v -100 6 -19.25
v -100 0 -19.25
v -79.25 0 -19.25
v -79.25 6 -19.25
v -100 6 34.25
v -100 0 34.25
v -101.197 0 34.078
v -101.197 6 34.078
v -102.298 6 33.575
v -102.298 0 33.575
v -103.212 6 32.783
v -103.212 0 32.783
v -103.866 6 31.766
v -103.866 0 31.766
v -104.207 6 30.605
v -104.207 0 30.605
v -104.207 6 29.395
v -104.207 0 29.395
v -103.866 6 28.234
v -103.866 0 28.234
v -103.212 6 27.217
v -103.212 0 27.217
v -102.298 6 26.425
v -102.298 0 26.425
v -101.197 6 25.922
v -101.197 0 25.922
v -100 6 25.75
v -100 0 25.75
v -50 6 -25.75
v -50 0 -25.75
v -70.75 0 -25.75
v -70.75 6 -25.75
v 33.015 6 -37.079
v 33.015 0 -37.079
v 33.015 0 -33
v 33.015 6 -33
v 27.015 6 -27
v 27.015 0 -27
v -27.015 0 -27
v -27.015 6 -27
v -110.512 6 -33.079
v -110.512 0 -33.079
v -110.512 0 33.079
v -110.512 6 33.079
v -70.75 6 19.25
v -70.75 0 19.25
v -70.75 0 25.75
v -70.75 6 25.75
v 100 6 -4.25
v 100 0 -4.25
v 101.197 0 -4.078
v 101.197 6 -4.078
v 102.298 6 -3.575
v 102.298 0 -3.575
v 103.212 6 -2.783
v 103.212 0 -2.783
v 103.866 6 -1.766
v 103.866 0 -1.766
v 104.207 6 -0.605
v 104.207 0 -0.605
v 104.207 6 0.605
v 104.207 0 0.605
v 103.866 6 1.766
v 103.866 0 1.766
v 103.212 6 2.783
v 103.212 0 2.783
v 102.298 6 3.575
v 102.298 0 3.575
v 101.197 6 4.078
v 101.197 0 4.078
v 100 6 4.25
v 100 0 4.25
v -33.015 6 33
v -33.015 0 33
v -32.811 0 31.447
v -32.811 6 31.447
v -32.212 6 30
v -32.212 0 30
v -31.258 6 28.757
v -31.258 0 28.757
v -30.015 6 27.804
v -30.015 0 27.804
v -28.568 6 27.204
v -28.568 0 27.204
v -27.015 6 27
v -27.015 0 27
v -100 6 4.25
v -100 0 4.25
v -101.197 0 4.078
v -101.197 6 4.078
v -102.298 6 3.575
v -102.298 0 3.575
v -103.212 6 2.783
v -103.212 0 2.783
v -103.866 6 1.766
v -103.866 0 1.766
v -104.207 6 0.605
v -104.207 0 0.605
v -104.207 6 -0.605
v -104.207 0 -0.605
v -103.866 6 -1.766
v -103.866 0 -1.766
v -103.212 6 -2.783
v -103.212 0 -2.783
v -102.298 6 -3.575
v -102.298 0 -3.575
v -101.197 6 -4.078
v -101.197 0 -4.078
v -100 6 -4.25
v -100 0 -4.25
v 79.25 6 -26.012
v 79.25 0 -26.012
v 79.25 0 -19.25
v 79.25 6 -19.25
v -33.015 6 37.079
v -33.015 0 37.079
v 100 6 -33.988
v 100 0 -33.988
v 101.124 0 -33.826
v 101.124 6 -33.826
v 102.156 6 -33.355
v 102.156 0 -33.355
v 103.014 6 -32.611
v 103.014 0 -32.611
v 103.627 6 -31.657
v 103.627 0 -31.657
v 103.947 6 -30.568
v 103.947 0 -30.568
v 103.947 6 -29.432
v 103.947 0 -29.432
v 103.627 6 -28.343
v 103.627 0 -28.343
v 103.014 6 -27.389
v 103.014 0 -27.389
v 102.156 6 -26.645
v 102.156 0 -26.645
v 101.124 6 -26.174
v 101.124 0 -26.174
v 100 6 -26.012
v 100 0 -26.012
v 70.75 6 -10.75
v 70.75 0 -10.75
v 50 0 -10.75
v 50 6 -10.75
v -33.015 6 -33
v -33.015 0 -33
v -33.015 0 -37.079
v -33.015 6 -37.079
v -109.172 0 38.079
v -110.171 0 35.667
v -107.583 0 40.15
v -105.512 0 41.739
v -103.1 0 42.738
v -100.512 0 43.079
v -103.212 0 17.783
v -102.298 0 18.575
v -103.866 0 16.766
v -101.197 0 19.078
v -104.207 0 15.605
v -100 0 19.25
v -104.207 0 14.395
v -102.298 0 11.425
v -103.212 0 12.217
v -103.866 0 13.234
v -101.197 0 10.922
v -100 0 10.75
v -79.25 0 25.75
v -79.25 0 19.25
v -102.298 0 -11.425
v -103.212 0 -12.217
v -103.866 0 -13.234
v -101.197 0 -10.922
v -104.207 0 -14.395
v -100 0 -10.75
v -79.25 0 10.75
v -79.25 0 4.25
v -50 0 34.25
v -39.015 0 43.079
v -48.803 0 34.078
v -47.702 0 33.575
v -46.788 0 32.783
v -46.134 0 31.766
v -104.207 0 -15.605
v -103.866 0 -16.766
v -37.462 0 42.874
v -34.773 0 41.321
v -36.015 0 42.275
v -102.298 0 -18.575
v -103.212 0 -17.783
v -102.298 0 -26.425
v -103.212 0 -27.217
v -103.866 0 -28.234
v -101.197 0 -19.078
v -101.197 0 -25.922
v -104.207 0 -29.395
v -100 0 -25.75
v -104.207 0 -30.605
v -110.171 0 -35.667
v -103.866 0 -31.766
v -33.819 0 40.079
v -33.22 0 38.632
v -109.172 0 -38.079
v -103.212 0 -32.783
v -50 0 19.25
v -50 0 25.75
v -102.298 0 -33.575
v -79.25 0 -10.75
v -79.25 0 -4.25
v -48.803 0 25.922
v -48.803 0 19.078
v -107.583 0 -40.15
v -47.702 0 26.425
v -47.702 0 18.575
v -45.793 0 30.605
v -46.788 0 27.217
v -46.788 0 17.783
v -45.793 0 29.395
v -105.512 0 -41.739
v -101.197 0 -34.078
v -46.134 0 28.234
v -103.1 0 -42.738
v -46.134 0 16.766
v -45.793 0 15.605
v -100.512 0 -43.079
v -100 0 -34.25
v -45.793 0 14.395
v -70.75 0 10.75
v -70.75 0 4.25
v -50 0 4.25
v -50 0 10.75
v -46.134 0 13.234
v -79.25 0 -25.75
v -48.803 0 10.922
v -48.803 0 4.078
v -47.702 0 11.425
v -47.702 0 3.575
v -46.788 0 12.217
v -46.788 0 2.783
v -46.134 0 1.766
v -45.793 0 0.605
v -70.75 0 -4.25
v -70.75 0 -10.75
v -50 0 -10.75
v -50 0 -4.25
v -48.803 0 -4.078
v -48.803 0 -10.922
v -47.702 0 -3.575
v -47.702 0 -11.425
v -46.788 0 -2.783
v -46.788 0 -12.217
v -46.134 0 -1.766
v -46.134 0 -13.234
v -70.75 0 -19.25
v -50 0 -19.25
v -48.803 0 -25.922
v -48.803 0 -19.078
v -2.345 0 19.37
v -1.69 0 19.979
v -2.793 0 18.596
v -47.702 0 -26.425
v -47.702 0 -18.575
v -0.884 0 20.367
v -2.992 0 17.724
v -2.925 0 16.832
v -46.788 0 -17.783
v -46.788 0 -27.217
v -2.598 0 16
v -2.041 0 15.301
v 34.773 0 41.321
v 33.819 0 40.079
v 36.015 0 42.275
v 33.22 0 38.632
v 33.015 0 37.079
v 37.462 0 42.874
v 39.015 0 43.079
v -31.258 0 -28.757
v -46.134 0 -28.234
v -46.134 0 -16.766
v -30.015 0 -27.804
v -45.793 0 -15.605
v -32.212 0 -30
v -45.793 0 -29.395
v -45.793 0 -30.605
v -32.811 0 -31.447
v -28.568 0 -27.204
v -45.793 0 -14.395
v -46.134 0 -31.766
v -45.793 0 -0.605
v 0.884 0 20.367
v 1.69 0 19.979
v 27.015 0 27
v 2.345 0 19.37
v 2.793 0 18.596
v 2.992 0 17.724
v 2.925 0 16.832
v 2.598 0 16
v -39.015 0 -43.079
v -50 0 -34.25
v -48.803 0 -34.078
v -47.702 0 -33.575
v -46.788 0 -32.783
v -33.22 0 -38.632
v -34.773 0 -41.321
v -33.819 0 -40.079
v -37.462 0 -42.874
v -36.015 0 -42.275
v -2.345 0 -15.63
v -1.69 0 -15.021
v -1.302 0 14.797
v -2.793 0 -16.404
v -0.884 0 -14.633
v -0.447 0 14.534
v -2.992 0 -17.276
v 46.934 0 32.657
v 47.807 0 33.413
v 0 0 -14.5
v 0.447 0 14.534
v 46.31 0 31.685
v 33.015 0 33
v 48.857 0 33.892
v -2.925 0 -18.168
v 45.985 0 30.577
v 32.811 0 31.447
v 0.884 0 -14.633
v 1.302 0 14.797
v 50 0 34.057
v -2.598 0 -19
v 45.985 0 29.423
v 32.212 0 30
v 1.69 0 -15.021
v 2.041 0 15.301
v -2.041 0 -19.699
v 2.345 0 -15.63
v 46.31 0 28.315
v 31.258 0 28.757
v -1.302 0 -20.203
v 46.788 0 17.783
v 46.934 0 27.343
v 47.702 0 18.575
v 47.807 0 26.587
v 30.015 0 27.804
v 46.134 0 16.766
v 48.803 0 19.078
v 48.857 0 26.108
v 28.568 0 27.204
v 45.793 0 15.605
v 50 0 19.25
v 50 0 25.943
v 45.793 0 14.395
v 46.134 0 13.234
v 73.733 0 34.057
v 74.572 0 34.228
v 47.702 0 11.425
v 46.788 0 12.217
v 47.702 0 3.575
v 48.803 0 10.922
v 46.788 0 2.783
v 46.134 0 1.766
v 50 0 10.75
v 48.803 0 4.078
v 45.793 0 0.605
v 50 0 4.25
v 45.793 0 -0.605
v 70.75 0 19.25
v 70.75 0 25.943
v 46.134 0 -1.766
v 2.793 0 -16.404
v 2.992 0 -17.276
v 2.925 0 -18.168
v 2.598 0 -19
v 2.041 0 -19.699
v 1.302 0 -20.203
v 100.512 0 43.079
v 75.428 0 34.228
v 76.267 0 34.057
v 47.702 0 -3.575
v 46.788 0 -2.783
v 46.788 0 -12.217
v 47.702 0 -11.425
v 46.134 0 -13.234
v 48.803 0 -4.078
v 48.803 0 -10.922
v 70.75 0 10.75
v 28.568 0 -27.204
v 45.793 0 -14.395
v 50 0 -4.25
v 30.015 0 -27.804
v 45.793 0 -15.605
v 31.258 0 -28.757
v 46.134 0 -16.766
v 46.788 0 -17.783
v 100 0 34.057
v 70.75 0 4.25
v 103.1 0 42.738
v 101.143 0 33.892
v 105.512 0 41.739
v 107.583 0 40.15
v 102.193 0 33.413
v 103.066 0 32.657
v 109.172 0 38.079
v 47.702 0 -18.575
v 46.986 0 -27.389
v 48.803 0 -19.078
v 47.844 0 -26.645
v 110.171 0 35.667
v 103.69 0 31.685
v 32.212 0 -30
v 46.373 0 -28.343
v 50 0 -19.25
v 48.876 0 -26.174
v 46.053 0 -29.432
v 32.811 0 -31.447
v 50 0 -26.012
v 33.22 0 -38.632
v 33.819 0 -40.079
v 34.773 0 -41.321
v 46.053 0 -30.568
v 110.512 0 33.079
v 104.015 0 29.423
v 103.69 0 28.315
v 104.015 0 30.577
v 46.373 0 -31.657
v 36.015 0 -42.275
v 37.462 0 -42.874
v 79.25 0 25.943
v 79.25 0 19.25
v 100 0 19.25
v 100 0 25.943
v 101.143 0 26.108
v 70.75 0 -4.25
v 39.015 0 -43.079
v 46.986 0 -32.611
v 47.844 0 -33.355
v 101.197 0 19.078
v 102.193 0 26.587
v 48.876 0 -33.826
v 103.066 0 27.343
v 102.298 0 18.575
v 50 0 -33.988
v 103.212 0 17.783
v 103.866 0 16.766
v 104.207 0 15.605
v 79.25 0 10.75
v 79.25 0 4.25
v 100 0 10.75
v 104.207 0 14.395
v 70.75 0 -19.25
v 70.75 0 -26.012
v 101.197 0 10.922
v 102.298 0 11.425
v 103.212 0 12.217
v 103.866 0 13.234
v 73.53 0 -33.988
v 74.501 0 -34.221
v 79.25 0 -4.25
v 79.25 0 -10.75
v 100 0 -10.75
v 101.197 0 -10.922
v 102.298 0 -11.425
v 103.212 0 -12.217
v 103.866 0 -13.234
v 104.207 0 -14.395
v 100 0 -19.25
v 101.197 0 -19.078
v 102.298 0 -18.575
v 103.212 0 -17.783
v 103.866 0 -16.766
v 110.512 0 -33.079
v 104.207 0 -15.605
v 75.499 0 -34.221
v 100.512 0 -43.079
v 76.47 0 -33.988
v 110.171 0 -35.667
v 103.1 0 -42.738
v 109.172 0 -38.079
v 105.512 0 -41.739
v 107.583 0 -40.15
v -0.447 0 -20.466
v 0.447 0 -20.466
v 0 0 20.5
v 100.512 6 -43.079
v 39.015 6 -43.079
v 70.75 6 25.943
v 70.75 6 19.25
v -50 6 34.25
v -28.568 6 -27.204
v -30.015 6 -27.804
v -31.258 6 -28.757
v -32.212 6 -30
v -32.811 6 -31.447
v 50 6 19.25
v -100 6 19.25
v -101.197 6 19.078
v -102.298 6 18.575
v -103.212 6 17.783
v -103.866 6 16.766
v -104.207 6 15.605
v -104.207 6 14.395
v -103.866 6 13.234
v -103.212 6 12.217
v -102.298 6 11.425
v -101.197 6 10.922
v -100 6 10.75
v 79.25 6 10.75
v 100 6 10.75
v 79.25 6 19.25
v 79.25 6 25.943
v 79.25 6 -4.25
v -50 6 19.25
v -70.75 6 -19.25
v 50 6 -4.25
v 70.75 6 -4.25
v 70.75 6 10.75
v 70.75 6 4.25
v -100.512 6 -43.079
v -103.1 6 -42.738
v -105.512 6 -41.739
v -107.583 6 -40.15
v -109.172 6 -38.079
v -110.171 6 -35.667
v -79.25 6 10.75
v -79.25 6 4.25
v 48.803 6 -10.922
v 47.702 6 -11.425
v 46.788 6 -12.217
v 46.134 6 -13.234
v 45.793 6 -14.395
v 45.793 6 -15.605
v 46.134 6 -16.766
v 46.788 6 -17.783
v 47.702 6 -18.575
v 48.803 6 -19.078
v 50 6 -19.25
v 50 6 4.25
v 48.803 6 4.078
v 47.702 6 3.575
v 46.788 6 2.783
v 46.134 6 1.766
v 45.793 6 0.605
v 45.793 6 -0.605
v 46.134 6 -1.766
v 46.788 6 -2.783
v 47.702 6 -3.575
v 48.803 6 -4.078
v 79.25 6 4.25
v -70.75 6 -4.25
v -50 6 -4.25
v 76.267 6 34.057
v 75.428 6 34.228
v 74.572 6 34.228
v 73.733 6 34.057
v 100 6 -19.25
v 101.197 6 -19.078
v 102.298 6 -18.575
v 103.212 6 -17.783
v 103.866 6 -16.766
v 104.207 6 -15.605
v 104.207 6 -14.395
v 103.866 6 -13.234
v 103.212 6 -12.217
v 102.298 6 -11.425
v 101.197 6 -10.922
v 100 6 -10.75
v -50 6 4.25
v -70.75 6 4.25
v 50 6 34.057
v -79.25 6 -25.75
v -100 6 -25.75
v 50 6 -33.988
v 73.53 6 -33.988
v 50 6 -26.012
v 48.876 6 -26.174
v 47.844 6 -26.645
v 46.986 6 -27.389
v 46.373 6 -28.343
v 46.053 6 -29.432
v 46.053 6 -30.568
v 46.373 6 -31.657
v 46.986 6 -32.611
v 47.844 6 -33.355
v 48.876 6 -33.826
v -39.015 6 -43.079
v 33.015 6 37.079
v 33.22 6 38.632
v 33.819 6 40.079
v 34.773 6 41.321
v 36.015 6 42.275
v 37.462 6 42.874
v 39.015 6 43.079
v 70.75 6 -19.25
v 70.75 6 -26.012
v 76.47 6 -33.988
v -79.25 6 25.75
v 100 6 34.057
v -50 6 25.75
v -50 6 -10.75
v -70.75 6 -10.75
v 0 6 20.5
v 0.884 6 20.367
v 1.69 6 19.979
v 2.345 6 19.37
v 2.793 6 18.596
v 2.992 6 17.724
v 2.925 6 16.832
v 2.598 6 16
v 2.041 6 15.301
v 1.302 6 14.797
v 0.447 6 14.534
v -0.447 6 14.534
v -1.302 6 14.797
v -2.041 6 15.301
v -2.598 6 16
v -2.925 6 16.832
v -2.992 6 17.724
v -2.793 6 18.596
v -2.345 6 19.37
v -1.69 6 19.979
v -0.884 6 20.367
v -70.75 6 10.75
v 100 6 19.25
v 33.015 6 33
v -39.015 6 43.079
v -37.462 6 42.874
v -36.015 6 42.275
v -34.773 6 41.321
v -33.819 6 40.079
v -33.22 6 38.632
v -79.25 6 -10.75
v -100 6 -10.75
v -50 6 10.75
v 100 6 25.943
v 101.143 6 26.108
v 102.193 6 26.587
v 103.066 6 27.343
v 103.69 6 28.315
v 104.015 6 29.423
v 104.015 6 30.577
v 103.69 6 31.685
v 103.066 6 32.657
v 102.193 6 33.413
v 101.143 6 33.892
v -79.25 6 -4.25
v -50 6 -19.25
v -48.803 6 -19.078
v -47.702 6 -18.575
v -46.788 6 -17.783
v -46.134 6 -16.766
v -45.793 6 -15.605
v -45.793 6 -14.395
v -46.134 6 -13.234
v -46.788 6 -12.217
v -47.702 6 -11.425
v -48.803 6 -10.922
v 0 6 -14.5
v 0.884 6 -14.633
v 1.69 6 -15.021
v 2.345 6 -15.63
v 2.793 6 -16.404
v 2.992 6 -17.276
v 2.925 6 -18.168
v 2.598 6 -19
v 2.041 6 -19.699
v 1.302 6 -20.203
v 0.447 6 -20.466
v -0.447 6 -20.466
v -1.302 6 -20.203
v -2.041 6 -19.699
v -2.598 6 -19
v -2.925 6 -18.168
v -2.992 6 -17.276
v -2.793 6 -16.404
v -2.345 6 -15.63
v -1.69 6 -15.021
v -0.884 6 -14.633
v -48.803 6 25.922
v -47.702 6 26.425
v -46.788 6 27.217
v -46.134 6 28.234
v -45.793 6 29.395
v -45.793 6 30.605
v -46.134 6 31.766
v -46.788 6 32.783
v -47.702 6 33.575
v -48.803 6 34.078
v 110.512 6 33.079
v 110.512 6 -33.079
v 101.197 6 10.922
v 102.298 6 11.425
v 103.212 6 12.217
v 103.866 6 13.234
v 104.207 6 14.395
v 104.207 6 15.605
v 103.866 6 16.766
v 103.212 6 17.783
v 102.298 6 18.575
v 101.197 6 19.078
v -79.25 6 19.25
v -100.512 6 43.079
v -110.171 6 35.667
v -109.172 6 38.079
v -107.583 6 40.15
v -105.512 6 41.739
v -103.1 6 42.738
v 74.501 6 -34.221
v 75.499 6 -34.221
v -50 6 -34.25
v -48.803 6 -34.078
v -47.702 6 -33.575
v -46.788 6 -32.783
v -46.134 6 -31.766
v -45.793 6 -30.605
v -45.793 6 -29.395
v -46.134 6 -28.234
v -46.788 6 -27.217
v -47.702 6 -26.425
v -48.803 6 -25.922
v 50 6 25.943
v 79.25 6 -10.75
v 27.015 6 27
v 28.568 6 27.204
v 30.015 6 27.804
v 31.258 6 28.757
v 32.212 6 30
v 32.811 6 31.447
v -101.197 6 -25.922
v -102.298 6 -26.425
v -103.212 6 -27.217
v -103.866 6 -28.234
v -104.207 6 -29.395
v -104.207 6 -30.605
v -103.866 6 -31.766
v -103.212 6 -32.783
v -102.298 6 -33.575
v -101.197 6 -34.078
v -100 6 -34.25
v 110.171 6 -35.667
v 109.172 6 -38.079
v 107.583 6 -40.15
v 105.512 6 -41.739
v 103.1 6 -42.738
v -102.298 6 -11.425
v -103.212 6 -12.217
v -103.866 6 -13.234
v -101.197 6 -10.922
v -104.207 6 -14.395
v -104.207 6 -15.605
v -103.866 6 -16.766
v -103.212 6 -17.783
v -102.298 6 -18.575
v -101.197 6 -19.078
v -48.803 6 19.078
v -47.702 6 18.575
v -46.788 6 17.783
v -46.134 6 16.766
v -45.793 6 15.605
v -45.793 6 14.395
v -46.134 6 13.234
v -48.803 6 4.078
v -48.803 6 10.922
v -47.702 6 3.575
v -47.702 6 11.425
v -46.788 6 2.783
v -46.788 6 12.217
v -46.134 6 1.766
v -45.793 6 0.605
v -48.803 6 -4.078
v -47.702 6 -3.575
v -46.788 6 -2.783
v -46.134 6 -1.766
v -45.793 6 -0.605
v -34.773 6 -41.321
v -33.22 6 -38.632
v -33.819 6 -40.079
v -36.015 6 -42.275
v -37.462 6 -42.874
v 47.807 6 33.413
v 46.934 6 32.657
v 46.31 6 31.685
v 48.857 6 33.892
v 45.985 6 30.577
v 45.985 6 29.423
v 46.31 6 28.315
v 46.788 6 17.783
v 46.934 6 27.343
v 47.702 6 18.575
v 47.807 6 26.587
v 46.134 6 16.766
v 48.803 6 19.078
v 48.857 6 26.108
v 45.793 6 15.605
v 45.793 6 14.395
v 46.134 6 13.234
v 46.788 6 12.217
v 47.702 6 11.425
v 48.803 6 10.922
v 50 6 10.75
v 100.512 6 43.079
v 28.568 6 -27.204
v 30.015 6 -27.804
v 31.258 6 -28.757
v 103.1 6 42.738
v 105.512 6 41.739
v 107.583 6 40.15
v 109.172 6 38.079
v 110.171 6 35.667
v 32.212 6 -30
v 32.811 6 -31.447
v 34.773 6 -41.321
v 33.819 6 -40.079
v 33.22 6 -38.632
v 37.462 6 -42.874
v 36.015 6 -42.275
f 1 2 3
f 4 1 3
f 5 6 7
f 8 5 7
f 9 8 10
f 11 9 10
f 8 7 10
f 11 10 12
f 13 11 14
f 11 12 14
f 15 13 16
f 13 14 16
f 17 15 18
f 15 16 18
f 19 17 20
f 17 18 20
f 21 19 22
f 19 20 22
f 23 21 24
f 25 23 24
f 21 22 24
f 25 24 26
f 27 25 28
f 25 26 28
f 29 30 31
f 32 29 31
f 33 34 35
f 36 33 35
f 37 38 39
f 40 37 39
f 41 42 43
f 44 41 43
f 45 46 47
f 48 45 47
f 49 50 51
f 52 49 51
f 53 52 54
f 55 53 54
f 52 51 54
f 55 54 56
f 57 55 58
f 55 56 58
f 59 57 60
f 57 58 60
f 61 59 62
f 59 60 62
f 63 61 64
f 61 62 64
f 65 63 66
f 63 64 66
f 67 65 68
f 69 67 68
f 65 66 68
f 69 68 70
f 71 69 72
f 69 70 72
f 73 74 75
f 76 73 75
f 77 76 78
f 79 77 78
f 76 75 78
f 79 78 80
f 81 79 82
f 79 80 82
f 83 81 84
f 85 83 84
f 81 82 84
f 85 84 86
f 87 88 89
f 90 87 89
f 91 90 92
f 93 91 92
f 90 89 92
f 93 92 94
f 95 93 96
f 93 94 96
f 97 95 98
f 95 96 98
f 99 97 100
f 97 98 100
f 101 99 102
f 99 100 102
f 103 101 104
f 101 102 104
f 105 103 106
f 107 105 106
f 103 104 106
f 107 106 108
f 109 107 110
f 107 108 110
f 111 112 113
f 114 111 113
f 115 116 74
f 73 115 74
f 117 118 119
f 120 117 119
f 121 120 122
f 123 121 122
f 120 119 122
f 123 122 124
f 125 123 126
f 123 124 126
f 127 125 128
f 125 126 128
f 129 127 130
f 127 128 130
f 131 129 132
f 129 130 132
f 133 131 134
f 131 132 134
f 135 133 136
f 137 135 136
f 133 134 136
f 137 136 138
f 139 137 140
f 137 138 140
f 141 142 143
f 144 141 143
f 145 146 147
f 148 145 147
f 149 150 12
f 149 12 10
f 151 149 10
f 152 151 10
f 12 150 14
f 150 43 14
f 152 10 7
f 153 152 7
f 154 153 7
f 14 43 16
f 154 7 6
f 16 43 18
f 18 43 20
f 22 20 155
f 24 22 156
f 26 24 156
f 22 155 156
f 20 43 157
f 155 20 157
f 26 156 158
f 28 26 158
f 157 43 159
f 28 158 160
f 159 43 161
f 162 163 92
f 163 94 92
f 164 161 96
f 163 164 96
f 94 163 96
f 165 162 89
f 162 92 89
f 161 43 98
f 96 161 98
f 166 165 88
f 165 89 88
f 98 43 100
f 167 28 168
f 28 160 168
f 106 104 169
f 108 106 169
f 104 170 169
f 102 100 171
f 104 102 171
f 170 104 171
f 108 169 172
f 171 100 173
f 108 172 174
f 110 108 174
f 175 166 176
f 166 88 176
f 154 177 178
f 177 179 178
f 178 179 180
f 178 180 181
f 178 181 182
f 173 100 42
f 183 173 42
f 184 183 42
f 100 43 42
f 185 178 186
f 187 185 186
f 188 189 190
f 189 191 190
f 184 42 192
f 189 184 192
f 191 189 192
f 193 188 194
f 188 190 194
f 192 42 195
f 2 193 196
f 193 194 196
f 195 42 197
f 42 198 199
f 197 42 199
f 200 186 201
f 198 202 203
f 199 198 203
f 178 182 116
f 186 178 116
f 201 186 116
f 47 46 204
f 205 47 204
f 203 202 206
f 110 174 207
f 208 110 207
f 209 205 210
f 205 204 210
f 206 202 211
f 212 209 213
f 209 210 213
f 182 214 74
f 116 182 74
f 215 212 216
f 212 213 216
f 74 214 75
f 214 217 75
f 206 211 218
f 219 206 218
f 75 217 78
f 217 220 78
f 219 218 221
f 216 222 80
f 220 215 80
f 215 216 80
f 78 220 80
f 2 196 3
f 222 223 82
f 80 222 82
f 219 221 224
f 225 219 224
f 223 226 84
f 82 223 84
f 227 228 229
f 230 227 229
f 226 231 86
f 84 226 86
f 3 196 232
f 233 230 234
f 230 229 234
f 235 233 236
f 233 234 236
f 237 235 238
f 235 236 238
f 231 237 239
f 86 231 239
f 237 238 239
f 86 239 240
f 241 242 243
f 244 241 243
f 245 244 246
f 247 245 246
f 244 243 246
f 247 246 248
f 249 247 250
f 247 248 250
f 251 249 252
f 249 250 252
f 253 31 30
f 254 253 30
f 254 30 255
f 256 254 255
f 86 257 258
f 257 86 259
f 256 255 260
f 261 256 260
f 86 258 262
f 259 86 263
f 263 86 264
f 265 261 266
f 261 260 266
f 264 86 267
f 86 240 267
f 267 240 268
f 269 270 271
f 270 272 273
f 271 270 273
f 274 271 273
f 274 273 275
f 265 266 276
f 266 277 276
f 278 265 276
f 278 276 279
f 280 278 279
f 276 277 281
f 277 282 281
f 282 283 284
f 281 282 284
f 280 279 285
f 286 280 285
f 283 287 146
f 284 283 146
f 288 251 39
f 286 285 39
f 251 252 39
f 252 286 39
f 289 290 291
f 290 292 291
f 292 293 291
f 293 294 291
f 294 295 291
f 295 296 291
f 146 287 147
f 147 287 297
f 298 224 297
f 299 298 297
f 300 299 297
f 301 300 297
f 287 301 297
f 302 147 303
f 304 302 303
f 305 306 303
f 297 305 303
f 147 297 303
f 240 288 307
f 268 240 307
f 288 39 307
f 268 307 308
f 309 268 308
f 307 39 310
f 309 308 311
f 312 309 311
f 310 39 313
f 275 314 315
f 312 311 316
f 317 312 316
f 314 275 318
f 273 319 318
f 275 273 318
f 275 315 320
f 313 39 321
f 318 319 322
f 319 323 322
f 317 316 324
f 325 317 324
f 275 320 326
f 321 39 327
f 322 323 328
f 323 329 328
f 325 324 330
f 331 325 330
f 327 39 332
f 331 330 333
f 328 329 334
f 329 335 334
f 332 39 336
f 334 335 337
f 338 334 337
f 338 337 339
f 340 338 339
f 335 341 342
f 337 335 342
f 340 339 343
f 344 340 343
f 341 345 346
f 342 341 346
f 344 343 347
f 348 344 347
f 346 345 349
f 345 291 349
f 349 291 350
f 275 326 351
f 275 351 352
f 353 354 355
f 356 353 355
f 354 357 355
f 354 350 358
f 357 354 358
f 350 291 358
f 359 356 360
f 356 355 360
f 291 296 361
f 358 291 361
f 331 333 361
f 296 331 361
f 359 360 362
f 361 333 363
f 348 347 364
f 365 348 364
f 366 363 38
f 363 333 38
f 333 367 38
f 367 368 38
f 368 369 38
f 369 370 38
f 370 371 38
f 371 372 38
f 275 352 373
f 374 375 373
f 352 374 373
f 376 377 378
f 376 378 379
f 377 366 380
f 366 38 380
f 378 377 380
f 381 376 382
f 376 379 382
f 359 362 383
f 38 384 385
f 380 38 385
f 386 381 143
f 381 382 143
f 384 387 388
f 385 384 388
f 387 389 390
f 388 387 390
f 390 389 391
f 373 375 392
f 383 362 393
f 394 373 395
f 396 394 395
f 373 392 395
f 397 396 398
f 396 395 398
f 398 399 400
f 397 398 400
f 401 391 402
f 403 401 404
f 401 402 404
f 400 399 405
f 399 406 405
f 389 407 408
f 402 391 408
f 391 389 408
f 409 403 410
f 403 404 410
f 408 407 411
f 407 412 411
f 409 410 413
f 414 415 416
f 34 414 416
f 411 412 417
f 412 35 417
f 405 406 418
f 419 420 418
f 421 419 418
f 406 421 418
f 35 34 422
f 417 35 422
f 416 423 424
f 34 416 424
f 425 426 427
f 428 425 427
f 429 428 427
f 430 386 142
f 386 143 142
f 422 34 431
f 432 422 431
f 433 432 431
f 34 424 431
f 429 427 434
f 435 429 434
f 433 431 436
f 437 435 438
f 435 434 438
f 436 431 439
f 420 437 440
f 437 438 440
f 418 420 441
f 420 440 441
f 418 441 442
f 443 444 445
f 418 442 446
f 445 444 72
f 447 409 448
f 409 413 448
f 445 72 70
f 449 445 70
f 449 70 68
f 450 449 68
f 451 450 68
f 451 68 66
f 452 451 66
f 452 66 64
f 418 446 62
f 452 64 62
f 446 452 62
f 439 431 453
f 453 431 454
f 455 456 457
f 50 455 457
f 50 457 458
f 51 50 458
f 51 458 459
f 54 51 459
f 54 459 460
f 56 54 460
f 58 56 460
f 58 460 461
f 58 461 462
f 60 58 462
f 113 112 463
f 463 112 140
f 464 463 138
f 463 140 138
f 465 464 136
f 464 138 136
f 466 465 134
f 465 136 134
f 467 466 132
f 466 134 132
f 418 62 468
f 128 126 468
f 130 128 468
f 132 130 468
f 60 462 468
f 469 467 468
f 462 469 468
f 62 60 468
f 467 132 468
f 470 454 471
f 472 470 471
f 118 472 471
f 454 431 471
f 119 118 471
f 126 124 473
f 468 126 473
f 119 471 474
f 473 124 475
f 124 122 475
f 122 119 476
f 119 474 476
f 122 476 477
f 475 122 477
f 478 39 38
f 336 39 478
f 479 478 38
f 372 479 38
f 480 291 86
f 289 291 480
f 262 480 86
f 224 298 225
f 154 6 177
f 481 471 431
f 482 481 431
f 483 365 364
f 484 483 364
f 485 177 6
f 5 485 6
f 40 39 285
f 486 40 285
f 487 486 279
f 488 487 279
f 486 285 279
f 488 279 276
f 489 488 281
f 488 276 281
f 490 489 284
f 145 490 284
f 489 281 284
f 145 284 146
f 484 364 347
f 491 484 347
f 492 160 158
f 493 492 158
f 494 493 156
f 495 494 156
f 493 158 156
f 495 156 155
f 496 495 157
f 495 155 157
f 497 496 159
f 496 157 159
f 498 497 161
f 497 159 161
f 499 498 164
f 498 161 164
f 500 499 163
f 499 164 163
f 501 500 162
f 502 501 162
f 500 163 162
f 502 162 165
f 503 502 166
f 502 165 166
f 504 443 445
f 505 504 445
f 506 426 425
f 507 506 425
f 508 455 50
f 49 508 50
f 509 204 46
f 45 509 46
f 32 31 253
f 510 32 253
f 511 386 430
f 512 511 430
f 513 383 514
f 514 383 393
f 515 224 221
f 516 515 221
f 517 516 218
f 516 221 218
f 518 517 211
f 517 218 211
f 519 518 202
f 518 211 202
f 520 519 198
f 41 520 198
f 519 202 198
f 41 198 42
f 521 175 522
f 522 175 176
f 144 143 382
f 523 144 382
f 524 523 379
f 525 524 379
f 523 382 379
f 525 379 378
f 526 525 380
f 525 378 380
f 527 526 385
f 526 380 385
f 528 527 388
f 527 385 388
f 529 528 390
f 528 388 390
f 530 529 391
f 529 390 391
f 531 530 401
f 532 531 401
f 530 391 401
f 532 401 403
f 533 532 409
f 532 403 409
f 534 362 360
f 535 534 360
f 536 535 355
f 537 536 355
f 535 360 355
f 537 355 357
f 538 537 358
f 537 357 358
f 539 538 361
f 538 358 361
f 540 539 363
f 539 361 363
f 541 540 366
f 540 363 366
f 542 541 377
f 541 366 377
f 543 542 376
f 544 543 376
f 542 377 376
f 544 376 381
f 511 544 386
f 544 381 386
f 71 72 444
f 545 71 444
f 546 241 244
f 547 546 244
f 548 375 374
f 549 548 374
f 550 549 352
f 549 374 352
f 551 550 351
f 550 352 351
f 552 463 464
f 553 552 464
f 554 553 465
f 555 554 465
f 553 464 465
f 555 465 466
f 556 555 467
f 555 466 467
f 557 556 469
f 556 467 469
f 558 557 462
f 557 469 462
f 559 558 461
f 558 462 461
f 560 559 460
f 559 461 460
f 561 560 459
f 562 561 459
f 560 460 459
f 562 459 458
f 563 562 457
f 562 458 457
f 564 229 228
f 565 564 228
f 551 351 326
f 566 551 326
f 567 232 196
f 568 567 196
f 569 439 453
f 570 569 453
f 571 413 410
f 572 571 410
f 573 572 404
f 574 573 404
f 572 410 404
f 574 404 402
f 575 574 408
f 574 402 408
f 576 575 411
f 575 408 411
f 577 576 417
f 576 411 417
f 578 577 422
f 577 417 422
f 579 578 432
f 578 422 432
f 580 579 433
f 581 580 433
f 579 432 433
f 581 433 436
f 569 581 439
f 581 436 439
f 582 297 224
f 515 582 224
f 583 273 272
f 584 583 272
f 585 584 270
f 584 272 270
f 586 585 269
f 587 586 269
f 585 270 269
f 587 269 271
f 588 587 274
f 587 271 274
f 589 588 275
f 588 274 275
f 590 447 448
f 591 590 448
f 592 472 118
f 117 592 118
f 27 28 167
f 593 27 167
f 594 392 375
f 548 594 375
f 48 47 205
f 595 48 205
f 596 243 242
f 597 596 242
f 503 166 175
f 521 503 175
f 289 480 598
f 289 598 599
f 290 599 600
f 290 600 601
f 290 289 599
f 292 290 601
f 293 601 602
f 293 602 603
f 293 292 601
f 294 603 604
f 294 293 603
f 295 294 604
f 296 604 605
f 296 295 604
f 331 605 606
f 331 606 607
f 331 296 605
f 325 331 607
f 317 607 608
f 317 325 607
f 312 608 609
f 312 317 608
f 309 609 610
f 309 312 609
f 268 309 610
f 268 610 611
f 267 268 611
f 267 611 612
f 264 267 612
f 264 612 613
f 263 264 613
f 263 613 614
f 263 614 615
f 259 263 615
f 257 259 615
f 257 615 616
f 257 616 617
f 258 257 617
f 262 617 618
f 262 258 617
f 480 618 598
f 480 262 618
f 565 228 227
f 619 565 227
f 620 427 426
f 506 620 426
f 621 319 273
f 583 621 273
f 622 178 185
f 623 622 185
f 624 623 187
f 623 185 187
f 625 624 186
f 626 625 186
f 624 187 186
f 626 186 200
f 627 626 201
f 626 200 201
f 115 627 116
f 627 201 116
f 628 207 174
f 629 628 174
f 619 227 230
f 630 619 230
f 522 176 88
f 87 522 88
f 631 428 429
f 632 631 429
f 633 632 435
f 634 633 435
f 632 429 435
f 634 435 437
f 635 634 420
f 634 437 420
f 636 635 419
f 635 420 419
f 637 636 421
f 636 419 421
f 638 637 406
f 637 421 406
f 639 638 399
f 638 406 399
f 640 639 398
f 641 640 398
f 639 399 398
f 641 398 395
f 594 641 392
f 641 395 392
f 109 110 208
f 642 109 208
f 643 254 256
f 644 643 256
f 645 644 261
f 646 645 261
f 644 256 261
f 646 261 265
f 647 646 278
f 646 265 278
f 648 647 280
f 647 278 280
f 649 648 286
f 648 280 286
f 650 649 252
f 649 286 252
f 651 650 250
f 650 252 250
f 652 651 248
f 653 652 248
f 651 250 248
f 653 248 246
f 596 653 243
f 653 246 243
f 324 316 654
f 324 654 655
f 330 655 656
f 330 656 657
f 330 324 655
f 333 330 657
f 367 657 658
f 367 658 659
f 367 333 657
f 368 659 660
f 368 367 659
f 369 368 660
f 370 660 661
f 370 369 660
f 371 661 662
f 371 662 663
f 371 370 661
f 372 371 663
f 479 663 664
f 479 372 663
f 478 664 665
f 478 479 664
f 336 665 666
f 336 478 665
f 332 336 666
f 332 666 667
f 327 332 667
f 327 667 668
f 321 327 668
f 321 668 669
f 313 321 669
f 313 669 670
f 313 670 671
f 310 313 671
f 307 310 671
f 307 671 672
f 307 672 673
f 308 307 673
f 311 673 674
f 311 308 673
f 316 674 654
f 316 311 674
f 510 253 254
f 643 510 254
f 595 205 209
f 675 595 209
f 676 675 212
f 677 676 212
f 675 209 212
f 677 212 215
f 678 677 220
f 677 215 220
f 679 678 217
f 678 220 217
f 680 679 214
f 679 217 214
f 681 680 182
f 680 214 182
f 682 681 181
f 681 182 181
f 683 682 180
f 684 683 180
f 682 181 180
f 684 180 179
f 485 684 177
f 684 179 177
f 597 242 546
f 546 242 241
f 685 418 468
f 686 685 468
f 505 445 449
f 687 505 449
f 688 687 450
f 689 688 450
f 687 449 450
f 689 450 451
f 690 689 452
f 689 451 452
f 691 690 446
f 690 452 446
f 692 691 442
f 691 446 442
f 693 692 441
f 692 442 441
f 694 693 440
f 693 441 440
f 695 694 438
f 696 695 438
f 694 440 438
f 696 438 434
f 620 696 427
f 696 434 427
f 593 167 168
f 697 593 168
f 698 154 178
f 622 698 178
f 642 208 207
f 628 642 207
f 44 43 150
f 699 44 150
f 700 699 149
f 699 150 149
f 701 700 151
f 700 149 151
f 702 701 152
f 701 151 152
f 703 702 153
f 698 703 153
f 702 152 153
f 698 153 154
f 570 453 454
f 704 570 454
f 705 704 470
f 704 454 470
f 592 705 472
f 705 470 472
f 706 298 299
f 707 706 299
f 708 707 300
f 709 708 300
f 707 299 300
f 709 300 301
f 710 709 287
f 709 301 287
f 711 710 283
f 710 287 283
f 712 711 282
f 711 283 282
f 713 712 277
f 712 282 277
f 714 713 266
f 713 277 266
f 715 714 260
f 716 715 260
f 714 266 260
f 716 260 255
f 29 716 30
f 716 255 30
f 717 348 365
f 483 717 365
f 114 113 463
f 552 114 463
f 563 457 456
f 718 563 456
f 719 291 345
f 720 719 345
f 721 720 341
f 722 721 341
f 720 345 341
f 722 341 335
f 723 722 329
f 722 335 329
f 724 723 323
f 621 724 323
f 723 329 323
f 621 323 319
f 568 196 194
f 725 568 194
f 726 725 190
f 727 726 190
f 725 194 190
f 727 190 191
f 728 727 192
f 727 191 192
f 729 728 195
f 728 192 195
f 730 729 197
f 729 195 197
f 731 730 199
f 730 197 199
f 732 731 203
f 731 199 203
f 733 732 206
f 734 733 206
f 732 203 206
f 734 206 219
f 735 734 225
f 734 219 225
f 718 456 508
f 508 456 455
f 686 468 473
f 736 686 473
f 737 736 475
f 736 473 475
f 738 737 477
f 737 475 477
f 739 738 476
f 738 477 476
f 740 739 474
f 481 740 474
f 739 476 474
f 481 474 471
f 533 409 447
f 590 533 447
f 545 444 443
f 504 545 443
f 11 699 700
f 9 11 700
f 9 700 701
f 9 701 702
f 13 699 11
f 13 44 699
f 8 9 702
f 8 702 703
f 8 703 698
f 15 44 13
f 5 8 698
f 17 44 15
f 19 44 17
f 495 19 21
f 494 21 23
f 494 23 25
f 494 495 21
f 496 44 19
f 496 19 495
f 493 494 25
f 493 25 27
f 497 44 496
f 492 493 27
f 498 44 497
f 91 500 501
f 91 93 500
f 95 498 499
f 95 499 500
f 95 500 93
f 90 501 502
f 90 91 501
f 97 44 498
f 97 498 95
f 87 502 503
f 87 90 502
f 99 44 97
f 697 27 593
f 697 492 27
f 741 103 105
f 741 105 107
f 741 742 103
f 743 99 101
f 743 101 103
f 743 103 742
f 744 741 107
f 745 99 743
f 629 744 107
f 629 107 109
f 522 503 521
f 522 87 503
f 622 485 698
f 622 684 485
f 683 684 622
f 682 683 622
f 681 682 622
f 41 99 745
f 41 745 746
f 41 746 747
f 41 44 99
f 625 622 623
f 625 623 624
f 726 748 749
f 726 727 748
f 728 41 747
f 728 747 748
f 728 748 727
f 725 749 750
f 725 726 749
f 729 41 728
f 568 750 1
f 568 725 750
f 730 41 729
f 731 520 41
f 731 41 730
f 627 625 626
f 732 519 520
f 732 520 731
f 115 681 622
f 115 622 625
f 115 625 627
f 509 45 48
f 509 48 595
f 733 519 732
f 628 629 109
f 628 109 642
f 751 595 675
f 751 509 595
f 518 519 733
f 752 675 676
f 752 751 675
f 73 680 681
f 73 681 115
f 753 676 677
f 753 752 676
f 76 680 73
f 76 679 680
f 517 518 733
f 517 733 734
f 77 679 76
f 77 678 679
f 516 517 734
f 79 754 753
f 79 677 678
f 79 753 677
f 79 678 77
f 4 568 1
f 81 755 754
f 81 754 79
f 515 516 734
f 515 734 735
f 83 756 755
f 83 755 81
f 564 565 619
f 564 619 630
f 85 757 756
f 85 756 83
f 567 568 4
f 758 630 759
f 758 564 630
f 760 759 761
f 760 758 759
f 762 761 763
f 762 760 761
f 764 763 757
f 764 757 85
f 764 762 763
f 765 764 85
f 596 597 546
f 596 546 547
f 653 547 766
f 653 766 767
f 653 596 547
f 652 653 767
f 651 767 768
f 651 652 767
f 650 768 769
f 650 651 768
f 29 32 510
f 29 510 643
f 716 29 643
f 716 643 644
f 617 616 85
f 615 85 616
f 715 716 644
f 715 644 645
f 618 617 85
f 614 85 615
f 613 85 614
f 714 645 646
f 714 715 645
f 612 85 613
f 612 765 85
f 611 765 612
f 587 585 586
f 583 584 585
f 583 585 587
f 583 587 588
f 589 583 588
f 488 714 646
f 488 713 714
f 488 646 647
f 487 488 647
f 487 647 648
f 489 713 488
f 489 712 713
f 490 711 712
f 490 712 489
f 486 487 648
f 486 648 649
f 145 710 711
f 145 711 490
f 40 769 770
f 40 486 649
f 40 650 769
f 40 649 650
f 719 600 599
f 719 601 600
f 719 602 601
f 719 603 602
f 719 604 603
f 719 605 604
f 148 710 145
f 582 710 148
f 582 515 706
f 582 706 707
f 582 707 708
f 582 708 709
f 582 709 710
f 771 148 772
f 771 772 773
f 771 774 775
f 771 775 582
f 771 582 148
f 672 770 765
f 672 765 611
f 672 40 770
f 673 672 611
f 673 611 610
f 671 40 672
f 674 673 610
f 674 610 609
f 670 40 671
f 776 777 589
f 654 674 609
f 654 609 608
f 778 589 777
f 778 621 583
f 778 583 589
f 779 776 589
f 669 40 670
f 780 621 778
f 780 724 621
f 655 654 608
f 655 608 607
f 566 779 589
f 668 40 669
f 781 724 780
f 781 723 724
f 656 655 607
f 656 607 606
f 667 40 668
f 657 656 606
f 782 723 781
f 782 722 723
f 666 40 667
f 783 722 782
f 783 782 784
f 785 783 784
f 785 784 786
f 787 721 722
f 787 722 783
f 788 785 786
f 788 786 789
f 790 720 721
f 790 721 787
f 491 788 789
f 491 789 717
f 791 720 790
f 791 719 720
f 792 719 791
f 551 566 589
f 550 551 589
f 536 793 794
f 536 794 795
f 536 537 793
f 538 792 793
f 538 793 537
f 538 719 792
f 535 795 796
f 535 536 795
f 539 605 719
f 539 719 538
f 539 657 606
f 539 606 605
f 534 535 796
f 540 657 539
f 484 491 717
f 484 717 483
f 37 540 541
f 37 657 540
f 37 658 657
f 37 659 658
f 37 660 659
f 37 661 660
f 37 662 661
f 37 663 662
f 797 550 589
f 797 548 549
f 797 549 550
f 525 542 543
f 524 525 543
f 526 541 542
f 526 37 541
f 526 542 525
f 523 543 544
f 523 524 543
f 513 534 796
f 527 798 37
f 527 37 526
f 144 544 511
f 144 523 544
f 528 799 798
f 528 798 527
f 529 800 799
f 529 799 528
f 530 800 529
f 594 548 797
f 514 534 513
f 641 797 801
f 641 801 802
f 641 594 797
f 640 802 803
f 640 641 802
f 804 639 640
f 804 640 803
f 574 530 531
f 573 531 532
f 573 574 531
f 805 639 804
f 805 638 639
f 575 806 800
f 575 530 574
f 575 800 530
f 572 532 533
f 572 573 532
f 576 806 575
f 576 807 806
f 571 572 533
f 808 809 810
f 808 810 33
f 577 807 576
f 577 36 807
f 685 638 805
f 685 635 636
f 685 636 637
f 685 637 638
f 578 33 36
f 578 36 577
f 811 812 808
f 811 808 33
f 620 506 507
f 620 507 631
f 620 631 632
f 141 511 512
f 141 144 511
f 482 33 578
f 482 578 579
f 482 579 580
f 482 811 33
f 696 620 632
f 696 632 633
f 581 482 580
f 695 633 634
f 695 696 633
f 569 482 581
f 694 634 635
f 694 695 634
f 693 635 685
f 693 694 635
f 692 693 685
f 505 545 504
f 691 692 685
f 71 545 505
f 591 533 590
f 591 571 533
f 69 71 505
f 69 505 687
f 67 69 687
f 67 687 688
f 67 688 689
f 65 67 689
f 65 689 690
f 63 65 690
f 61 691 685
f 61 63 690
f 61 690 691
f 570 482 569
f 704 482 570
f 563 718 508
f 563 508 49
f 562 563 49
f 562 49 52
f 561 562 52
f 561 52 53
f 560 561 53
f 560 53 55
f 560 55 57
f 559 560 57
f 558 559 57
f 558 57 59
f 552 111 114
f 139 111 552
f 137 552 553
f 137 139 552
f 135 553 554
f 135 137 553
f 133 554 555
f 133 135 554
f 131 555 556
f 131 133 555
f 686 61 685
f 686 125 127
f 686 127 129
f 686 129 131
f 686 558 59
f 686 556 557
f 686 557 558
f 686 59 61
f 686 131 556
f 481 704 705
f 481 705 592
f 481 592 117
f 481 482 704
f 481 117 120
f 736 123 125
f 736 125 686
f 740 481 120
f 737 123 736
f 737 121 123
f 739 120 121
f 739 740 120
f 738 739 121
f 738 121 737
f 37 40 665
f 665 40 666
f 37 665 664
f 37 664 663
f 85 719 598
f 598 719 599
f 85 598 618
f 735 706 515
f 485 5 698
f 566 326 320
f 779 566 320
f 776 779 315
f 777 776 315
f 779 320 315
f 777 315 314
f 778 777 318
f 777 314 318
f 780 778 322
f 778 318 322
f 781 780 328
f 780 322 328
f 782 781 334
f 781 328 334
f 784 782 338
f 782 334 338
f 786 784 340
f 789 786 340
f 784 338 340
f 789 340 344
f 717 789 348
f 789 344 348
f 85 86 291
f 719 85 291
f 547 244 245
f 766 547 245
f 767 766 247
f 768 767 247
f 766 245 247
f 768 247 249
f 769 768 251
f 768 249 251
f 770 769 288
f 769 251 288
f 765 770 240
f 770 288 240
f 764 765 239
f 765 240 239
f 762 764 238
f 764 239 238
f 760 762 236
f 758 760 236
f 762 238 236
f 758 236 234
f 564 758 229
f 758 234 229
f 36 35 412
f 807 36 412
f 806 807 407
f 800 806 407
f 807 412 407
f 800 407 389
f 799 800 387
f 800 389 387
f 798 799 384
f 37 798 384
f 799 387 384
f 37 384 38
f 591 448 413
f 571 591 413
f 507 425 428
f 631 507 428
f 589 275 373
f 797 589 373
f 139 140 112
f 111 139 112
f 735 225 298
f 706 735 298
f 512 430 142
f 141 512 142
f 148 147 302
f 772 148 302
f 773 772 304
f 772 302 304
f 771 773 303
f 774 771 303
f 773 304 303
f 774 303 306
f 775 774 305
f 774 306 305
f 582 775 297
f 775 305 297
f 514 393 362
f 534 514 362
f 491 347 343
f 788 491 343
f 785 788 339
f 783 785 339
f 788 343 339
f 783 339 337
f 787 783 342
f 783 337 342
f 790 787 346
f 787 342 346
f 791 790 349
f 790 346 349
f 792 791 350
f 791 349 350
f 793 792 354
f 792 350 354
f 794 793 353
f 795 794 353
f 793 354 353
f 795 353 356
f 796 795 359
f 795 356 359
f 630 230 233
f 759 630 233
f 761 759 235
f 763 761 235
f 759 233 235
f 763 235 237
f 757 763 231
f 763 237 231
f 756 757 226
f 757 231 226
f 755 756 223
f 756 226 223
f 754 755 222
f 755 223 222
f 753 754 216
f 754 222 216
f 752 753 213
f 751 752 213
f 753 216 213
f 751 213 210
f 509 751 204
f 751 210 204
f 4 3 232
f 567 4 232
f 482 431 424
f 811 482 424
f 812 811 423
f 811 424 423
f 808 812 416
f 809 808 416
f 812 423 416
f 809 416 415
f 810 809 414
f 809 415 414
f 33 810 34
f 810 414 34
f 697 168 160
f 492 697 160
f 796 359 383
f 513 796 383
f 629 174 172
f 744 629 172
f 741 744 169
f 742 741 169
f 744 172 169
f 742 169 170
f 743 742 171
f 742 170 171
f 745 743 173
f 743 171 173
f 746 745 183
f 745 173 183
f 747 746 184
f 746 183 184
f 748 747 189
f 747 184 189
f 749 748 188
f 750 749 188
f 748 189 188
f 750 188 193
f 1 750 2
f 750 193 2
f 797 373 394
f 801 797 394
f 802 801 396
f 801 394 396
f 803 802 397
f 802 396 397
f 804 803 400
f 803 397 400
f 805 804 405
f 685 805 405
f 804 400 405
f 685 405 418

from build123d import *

# Parameters (mm, degrees)
CROQUIS1_R              = 3
SALIENTE_EXTRUIR1_DEPTH = 6


with BuildPart() as part:
    # Croquis1 → Saliente-Extruir1 (new body)
    with BuildSketch(Plane(origin=(0, 0, 0), x_dir=(1, 0, 0), z_dir=(0, 1, 0))):
        with BuildLine():
            Line((39.015376651, -43.078821925), (100.511897923, -43.078821925))
            ThreePointArc((100.511897923, -43.078821925), (107.582965735, -40.149889737), (110.511897923, -33.078821925))
            Line((110.511897923, -33.078821925), (110.511897923, 33.078821925))
            ThreePointArc((110.511897923, 33.078821925), (107.582965735, 40.149889737), (100.511897923, 43.078821925))
            Line((100.511897923, 43.078821925), (39.015376651, 43.078821925))
            ThreePointArc((39.015376651, 43.078821925), (34.772735964, 41.321462613), (33.015376651, 37.078821925))
            Line((33.015376651, 37.078821925), (33.015376651, 33))
            ThreePointArc((33.015376651, 33), (31.258017338, 28.757359313), (27.015376651, 27))
            Line((27.015376651, 27), (-27.015376651, 27))
            ThreePointArc((-27.015376651, 27), (-31.258017338, 28.757359313), (-33.015376651, 33))
            Line((-33.015376651, 33), (-33.015376651, 37.078821925))
            ThreePointArc((-33.015376651, 37.078821925), (-34.772735964, 41.321462613), (-39.015376651, 43.078821925))
            Line((-39.015376651, 43.078821925), (-100.511897923, 43.078821925))
            ThreePointArc((-100.511897923, 43.078821925), (-107.582965735, 40.149889737), (-110.511897923, 33.078821925))
            Line((-110.511897923, 33.078821925), (-110.511897923, -33.078821925))
            ThreePointArc((-110.511897923, -33.078821925), (-107.582965735, -40.149889737), (-100.511897923, -43.078821925))
            Line((-100.511897923, -43.078821925), (-39.015376651, -43.078821925))
            ThreePointArc((-39.015376651, -43.078821925), (-34.772735964, -41.321462613), (-33.015376651, -37.078821925))
            Line((-33.015376651, -37.078821925), (-33.015376651, -33))
            ThreePointArc((-33.015376651, -33), (-31.258017338, -28.757359313), (-27.015376651, -27))
            Line((-27.015376651, -27), (27.015376651, -27))
            ThreePointArc((27.015376651, -27), (31.258017338, -28.757359313), (33.015376651, -33))
            Line((33.015376651, -33), (33.015376651, -37.078821925))
            ThreePointArc((33.015376651, -37.078821925), (34.772735964, -41.321462613), (39.015376651, -43.078821925))
        make_face()
        with BuildLine():
            Line((-100, -25.75), (-79.25, -25.75))
            Line((-79.25, -25.75), (-79.25, -19.25))
            Line((-79.25, -19.25), (-100, -19.25))
            ThreePointArc((-100, -19.25), (-104.25, -15), (-100, -10.75))
            Line((-100, -10.75), (-79.25, -10.75))
            Line((-79.25, -10.75), (-79.25, -4.25))
            Line((-79.25, -4.25), (-100, -4.25))
            ThreePointArc((-100, -4.25), (-104.25, 0), (-100, 4.25))
            Line((-100, 4.25), (-79.25, 4.25))
            Line((-79.25, 4.25), (-79.25, 10.75))
            Line((-79.25, 10.75), (-100, 10.75))
            ThreePointArc((-100, 10.75), (-104.25, 15), (-100, 19.25))
            Line((-100, 19.25), (-79.25, 19.25))
            Line((-79.25, 19.25), (-79.25, 25.75))
            Line((-79.25, 25.75), (-100, 25.75))
            ThreePointArc((-100, 25.75), (-104.25, 30), (-100, 34.25))
            Line((-100, 34.25), (-75, 34.25))
            Line((-75, 34.25), (-50, 34.25))
            ThreePointArc((-50, 34.25), (-45.75, 30), (-50, 25.75))
            Line((-50, 25.75), (-70.75, 25.75))
            Line((-70.75, 25.75), (-70.75, 19.25))
            Line((-70.75, 19.25), (-50, 19.25))
            ThreePointArc((-50, 19.25), (-45.75, 15), (-50, 10.75))
            Line((-50, 10.75), (-70.75, 10.75))
            Line((-70.75, 10.75), (-70.75, 4.25))
            Line((-70.75, 4.25), (-50, 4.25))
            ThreePointArc((-50, 4.25), (-45.75, 0), (-50, -4.25))
            Line((-50, -4.25), (-70.75, -4.25))
            Line((-70.75, -4.25), (-70.75, -10.75))
            Line((-70.75, -10.75), (-50, -10.75))
            ThreePointArc((-50, -10.75), (-45.75, -15), (-50, -19.25))
            Line((-50, -19.25), (-70.75, -19.25))
            Line((-70.75, -19.25), (-70.75, -25.75))
            Line((-70.75, -25.75), (-50, -25.75))
            ThreePointArc((-50, -25.75), (-45.75, -30), (-50, -34.25))
            Line((-50, -34.25), (-75, -34.25))
            Line((-75, -34.25), (-100, -34.25))
            ThreePointArc((-100, -34.25), (-104.25, -30), (-100, -25.75))
        make_face(mode=Mode.SUBTRACT)
        with Locations(Location((0, -17.5, 0), (0, 0, 270))):
            Circle(CROQUIS1_R, mode=Mode.SUBTRACT)
        with BuildLine():
            Line((79.25, -19.25), (79.25, -25.9432425))
            Line((79.25, -25.9432425), (100, -25.9432425))
            ThreePointArc((100, -25.9432425), (104.0567575, -30), (100, -34.0567575))
            Line((100, -34.0567575), (76.266972211, -34.0567575))
            ThreePointArc((76.266972211, -34.0567575), (75, -34.25), (73.733027789, -34.0567575))
            Line((73.733027789, -34.0567575), (50, -34.0567575))
            ThreePointArc((50, -34.0567575), (45.9432425, -30), (50, -25.9432425))
            Line((50, -25.9432425), (70.75, -25.9432425))
            Line((70.75, -25.9432425), (70.75, -19.25))
            Line((70.75, -19.25), (50, -19.25))
            ThreePointArc((50, -19.25), (45.75, -15), (50, -10.75))
            Line((50, -10.75), (70.75, -10.75))
            Line((70.75, -10.75), (70.75, -4.25))
            Line((70.75, -4.25), (50, -4.25))
            ThreePointArc((50, -4.25), (45.75, 0), (50, 4.25))
            Line((50, 4.25), (70.75, 4.25))
            Line((70.75, 4.25), (70.75, 10.75))
            Line((70.75, 10.75), (50, 10.75))
            ThreePointArc((50, 10.75), (45.75, 15), (50, 19.25))
            Line((50, 19.25), (70.75, 19.25))
            Line((70.75, 19.25), (70.75, 26.012157078))
            Line((70.75, 26.012157078), (50, 26.012157078))
            ThreePointArc((50, 26.012157078), (46.012157078, 30), (50, 33.987842922))
            Line((50, 33.987842922), (73.530439238, 33.987842922))
            ThreePointArc((73.530439238, 33.987842922), (75, 34.25), (76.469560762, 33.987842922))
            Line((76.469560762, 33.987842922), (100, 33.987842922))
            ThreePointArc((100, 33.987842922), (103.987842922, 30), (100, 26.012157078))
            Line((100, 26.012157078), (79.25, 26.012157078))
            Line((79.25, 26.012157078), (79.25, 19.25))
            Line((79.25, 19.25), (100, 19.25))
            ThreePointArc((100, 19.25), (104.25, 15), (100, 10.75))
            Line((100, 10.75), (79.25, 10.75))
            Line((79.25, 10.75), (79.25, 4.25))
            Line((79.25, 4.25), (100, 4.25))
            ThreePointArc((100, 4.25), (104.25, 0), (100, -4.25))
            Line((100, -4.25), (79.25, -4.25))
            Line((79.25, -4.25), (79.25, -10.75))
            Line((79.25, -10.75), (100, -10.75))
            ThreePointArc((100, -10.75), (104.25, -15), (100, -19.25))
            Line((100, -19.25), (79.25, -19.25))
        make_face(mode=Mode.SUBTRACT)
        with Locations(Location((0, 17.5, 0), (0, 0, 270))):
            Circle(CROQUIS1_R, mode=Mode.SUBTRACT)
    extrude(amount=SALIENTE_EXTRUIR1_DEPTH)


solid = part.part
